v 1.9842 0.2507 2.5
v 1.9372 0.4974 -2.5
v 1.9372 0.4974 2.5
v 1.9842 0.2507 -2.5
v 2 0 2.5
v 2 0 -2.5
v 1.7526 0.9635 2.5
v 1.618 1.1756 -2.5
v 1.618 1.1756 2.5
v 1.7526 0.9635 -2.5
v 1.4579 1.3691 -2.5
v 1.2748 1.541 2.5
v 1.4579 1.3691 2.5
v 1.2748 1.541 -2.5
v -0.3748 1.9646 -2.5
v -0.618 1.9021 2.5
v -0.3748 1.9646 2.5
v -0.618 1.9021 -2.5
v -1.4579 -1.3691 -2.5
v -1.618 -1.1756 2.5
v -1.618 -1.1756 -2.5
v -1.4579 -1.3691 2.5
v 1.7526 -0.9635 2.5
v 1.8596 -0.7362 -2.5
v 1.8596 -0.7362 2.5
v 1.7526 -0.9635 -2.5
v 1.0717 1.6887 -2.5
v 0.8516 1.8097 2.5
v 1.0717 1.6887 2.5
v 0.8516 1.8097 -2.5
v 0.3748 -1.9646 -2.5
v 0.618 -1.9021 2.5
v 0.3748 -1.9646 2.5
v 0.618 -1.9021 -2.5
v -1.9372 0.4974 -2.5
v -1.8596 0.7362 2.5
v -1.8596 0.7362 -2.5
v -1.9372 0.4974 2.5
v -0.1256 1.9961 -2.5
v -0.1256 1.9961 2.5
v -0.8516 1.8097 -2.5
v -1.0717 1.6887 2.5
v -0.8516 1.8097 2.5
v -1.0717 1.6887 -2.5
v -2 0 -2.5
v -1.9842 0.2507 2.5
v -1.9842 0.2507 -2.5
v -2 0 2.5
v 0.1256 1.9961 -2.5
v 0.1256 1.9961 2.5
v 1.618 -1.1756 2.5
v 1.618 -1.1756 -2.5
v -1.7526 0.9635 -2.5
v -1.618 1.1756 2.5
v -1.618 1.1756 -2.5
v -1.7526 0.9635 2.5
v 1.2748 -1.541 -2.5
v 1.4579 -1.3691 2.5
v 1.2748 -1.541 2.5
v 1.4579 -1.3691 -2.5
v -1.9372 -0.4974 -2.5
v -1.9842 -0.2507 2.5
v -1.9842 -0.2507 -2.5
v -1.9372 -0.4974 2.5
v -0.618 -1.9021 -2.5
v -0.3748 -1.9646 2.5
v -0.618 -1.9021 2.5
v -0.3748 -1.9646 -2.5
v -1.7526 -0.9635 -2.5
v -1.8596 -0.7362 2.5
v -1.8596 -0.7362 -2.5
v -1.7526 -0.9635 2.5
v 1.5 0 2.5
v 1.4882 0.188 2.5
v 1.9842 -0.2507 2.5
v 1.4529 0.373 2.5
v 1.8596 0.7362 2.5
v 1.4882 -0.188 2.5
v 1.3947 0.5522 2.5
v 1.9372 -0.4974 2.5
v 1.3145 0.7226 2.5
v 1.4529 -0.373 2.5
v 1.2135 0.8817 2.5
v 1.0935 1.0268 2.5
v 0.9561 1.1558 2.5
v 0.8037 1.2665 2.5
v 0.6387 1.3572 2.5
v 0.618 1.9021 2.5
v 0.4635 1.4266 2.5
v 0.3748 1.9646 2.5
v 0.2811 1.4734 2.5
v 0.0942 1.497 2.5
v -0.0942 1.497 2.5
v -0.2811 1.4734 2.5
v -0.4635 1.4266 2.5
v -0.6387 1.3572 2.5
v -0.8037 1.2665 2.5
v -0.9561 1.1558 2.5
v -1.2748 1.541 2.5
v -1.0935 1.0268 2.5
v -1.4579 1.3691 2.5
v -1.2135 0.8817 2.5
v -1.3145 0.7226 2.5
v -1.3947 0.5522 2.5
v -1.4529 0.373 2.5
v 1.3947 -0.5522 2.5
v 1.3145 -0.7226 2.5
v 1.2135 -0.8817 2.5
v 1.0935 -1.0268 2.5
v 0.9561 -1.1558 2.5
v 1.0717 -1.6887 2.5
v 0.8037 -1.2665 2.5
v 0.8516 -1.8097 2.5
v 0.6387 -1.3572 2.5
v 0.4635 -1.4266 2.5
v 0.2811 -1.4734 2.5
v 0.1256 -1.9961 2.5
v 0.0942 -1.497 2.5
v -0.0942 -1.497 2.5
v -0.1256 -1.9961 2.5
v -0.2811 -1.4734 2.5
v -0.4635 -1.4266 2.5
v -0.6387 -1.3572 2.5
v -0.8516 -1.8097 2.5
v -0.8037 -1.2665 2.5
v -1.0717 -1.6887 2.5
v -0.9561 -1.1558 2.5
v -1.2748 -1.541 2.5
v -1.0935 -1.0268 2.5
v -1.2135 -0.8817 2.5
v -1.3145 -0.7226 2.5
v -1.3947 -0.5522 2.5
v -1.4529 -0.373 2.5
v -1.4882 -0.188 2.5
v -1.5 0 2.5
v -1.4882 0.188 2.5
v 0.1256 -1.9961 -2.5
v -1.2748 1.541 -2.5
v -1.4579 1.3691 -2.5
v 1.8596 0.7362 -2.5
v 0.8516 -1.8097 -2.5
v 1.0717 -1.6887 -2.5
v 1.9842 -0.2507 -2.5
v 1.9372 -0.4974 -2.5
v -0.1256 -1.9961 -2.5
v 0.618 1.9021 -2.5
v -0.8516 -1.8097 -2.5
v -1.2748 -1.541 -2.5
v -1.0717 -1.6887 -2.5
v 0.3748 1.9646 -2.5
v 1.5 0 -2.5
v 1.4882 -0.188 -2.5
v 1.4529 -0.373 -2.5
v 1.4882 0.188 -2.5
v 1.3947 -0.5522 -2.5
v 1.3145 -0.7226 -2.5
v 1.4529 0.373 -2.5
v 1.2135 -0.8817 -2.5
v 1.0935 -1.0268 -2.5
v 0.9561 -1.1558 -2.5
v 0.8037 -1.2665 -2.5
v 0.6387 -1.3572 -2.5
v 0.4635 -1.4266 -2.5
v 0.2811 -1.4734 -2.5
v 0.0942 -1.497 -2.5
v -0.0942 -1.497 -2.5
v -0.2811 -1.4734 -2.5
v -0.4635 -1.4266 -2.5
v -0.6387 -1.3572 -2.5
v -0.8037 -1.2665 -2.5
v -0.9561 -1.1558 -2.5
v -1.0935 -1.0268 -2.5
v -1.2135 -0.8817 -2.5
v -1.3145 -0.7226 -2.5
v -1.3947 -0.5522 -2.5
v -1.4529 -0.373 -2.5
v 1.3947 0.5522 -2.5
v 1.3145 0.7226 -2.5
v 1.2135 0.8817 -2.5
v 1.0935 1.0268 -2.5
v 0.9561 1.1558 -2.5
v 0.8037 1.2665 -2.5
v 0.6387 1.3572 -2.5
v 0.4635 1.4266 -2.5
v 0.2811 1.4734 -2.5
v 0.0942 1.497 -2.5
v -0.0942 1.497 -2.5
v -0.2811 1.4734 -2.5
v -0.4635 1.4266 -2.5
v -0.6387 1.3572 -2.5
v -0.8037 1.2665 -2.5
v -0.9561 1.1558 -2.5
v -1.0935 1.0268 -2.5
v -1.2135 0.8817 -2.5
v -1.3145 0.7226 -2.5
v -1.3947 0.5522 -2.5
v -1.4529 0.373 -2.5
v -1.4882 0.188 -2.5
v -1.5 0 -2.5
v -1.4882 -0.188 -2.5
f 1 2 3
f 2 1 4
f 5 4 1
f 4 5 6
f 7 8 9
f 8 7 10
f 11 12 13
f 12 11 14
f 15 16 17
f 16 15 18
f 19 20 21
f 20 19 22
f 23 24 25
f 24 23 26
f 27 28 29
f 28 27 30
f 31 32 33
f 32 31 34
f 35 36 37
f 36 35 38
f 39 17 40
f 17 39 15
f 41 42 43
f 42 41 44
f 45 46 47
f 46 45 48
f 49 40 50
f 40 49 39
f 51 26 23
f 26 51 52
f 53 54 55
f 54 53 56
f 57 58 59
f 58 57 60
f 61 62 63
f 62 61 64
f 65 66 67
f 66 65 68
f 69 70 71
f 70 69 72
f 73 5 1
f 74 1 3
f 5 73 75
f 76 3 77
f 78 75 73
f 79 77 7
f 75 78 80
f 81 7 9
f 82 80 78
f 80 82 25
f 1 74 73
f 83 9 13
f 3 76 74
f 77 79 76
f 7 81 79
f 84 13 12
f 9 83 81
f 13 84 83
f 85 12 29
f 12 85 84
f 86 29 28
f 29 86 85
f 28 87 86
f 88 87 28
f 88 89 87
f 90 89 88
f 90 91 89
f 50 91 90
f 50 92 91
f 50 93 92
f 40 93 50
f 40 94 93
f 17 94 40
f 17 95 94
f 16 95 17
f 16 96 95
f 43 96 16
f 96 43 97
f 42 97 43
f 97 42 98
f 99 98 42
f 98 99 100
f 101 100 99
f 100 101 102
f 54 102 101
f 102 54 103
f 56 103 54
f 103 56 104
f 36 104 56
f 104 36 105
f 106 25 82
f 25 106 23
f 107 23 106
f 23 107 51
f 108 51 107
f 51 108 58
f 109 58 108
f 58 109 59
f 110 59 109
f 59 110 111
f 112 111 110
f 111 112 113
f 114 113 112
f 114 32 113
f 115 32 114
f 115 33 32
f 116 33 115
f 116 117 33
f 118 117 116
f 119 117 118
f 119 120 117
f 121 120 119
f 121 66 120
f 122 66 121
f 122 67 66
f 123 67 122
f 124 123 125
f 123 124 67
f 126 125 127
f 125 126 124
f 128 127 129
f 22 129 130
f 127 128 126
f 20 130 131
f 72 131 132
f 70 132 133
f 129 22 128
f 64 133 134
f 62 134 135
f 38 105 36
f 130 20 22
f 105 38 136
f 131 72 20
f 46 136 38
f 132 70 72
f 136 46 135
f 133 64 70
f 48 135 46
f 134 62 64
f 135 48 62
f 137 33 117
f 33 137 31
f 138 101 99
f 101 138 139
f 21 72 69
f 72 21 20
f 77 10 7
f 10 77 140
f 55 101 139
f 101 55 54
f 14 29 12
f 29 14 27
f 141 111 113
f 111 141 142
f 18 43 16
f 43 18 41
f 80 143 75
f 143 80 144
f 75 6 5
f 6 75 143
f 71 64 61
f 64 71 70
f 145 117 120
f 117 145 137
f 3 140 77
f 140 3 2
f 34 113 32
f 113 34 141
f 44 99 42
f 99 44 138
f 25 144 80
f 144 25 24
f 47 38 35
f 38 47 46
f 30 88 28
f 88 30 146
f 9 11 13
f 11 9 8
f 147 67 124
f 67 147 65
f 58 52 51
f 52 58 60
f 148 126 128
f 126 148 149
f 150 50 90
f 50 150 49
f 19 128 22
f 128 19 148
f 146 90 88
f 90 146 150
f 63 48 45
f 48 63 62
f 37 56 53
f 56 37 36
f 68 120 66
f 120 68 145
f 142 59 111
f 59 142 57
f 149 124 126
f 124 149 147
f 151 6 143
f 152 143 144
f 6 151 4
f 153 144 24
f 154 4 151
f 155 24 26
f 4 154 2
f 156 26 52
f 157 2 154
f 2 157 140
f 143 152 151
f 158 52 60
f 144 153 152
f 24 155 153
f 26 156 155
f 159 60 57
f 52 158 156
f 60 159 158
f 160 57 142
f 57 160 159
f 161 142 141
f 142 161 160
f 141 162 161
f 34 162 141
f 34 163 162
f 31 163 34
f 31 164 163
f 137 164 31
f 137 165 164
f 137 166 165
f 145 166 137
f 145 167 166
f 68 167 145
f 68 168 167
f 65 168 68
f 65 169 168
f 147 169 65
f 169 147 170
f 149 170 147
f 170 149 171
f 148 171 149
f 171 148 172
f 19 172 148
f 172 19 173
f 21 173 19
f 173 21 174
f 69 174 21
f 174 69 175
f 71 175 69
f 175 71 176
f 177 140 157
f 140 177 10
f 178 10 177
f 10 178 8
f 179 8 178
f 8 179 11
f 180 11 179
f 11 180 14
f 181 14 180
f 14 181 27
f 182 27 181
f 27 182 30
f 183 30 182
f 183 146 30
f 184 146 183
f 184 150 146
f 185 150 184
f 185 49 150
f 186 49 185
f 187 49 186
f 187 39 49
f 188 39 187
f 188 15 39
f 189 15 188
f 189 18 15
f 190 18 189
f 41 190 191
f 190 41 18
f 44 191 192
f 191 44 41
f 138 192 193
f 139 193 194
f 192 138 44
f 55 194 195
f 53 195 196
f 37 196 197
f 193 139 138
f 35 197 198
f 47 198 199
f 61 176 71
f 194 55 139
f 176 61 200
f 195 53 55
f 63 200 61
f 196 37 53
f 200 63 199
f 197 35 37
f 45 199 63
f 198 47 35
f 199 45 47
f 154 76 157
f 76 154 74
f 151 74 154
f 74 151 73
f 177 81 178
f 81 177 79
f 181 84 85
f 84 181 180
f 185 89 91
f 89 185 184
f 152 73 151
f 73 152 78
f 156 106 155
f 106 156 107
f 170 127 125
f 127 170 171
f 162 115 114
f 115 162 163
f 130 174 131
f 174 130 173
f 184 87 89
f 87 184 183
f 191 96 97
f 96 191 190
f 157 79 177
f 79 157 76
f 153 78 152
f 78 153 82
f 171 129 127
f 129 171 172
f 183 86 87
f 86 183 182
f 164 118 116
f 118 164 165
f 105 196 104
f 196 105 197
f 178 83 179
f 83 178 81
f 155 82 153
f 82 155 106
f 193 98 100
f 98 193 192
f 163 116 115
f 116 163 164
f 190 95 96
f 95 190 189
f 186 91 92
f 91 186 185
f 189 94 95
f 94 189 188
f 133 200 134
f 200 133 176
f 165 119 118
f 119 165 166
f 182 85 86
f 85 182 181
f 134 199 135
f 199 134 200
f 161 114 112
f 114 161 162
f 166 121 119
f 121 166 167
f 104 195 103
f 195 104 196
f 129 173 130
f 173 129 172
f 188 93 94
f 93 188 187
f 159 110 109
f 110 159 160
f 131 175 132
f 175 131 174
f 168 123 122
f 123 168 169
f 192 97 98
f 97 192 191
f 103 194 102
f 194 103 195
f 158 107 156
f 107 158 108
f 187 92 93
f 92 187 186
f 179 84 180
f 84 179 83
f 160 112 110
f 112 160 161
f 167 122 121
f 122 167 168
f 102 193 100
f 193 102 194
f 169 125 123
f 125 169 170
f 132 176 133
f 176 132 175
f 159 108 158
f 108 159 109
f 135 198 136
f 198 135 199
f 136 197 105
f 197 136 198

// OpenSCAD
$fn = 50;


difference() {
	union() {
		translate(v = [0, 0, -2.5000000000]) {
			cylinder(h = 5, r = 2.0000000000);
		}
	}
	union() {
		translate(v = [0, 0, -100.0000000000]) {
			cylinder(h = 200, r = 1.5000000000);
		}
	}
}
